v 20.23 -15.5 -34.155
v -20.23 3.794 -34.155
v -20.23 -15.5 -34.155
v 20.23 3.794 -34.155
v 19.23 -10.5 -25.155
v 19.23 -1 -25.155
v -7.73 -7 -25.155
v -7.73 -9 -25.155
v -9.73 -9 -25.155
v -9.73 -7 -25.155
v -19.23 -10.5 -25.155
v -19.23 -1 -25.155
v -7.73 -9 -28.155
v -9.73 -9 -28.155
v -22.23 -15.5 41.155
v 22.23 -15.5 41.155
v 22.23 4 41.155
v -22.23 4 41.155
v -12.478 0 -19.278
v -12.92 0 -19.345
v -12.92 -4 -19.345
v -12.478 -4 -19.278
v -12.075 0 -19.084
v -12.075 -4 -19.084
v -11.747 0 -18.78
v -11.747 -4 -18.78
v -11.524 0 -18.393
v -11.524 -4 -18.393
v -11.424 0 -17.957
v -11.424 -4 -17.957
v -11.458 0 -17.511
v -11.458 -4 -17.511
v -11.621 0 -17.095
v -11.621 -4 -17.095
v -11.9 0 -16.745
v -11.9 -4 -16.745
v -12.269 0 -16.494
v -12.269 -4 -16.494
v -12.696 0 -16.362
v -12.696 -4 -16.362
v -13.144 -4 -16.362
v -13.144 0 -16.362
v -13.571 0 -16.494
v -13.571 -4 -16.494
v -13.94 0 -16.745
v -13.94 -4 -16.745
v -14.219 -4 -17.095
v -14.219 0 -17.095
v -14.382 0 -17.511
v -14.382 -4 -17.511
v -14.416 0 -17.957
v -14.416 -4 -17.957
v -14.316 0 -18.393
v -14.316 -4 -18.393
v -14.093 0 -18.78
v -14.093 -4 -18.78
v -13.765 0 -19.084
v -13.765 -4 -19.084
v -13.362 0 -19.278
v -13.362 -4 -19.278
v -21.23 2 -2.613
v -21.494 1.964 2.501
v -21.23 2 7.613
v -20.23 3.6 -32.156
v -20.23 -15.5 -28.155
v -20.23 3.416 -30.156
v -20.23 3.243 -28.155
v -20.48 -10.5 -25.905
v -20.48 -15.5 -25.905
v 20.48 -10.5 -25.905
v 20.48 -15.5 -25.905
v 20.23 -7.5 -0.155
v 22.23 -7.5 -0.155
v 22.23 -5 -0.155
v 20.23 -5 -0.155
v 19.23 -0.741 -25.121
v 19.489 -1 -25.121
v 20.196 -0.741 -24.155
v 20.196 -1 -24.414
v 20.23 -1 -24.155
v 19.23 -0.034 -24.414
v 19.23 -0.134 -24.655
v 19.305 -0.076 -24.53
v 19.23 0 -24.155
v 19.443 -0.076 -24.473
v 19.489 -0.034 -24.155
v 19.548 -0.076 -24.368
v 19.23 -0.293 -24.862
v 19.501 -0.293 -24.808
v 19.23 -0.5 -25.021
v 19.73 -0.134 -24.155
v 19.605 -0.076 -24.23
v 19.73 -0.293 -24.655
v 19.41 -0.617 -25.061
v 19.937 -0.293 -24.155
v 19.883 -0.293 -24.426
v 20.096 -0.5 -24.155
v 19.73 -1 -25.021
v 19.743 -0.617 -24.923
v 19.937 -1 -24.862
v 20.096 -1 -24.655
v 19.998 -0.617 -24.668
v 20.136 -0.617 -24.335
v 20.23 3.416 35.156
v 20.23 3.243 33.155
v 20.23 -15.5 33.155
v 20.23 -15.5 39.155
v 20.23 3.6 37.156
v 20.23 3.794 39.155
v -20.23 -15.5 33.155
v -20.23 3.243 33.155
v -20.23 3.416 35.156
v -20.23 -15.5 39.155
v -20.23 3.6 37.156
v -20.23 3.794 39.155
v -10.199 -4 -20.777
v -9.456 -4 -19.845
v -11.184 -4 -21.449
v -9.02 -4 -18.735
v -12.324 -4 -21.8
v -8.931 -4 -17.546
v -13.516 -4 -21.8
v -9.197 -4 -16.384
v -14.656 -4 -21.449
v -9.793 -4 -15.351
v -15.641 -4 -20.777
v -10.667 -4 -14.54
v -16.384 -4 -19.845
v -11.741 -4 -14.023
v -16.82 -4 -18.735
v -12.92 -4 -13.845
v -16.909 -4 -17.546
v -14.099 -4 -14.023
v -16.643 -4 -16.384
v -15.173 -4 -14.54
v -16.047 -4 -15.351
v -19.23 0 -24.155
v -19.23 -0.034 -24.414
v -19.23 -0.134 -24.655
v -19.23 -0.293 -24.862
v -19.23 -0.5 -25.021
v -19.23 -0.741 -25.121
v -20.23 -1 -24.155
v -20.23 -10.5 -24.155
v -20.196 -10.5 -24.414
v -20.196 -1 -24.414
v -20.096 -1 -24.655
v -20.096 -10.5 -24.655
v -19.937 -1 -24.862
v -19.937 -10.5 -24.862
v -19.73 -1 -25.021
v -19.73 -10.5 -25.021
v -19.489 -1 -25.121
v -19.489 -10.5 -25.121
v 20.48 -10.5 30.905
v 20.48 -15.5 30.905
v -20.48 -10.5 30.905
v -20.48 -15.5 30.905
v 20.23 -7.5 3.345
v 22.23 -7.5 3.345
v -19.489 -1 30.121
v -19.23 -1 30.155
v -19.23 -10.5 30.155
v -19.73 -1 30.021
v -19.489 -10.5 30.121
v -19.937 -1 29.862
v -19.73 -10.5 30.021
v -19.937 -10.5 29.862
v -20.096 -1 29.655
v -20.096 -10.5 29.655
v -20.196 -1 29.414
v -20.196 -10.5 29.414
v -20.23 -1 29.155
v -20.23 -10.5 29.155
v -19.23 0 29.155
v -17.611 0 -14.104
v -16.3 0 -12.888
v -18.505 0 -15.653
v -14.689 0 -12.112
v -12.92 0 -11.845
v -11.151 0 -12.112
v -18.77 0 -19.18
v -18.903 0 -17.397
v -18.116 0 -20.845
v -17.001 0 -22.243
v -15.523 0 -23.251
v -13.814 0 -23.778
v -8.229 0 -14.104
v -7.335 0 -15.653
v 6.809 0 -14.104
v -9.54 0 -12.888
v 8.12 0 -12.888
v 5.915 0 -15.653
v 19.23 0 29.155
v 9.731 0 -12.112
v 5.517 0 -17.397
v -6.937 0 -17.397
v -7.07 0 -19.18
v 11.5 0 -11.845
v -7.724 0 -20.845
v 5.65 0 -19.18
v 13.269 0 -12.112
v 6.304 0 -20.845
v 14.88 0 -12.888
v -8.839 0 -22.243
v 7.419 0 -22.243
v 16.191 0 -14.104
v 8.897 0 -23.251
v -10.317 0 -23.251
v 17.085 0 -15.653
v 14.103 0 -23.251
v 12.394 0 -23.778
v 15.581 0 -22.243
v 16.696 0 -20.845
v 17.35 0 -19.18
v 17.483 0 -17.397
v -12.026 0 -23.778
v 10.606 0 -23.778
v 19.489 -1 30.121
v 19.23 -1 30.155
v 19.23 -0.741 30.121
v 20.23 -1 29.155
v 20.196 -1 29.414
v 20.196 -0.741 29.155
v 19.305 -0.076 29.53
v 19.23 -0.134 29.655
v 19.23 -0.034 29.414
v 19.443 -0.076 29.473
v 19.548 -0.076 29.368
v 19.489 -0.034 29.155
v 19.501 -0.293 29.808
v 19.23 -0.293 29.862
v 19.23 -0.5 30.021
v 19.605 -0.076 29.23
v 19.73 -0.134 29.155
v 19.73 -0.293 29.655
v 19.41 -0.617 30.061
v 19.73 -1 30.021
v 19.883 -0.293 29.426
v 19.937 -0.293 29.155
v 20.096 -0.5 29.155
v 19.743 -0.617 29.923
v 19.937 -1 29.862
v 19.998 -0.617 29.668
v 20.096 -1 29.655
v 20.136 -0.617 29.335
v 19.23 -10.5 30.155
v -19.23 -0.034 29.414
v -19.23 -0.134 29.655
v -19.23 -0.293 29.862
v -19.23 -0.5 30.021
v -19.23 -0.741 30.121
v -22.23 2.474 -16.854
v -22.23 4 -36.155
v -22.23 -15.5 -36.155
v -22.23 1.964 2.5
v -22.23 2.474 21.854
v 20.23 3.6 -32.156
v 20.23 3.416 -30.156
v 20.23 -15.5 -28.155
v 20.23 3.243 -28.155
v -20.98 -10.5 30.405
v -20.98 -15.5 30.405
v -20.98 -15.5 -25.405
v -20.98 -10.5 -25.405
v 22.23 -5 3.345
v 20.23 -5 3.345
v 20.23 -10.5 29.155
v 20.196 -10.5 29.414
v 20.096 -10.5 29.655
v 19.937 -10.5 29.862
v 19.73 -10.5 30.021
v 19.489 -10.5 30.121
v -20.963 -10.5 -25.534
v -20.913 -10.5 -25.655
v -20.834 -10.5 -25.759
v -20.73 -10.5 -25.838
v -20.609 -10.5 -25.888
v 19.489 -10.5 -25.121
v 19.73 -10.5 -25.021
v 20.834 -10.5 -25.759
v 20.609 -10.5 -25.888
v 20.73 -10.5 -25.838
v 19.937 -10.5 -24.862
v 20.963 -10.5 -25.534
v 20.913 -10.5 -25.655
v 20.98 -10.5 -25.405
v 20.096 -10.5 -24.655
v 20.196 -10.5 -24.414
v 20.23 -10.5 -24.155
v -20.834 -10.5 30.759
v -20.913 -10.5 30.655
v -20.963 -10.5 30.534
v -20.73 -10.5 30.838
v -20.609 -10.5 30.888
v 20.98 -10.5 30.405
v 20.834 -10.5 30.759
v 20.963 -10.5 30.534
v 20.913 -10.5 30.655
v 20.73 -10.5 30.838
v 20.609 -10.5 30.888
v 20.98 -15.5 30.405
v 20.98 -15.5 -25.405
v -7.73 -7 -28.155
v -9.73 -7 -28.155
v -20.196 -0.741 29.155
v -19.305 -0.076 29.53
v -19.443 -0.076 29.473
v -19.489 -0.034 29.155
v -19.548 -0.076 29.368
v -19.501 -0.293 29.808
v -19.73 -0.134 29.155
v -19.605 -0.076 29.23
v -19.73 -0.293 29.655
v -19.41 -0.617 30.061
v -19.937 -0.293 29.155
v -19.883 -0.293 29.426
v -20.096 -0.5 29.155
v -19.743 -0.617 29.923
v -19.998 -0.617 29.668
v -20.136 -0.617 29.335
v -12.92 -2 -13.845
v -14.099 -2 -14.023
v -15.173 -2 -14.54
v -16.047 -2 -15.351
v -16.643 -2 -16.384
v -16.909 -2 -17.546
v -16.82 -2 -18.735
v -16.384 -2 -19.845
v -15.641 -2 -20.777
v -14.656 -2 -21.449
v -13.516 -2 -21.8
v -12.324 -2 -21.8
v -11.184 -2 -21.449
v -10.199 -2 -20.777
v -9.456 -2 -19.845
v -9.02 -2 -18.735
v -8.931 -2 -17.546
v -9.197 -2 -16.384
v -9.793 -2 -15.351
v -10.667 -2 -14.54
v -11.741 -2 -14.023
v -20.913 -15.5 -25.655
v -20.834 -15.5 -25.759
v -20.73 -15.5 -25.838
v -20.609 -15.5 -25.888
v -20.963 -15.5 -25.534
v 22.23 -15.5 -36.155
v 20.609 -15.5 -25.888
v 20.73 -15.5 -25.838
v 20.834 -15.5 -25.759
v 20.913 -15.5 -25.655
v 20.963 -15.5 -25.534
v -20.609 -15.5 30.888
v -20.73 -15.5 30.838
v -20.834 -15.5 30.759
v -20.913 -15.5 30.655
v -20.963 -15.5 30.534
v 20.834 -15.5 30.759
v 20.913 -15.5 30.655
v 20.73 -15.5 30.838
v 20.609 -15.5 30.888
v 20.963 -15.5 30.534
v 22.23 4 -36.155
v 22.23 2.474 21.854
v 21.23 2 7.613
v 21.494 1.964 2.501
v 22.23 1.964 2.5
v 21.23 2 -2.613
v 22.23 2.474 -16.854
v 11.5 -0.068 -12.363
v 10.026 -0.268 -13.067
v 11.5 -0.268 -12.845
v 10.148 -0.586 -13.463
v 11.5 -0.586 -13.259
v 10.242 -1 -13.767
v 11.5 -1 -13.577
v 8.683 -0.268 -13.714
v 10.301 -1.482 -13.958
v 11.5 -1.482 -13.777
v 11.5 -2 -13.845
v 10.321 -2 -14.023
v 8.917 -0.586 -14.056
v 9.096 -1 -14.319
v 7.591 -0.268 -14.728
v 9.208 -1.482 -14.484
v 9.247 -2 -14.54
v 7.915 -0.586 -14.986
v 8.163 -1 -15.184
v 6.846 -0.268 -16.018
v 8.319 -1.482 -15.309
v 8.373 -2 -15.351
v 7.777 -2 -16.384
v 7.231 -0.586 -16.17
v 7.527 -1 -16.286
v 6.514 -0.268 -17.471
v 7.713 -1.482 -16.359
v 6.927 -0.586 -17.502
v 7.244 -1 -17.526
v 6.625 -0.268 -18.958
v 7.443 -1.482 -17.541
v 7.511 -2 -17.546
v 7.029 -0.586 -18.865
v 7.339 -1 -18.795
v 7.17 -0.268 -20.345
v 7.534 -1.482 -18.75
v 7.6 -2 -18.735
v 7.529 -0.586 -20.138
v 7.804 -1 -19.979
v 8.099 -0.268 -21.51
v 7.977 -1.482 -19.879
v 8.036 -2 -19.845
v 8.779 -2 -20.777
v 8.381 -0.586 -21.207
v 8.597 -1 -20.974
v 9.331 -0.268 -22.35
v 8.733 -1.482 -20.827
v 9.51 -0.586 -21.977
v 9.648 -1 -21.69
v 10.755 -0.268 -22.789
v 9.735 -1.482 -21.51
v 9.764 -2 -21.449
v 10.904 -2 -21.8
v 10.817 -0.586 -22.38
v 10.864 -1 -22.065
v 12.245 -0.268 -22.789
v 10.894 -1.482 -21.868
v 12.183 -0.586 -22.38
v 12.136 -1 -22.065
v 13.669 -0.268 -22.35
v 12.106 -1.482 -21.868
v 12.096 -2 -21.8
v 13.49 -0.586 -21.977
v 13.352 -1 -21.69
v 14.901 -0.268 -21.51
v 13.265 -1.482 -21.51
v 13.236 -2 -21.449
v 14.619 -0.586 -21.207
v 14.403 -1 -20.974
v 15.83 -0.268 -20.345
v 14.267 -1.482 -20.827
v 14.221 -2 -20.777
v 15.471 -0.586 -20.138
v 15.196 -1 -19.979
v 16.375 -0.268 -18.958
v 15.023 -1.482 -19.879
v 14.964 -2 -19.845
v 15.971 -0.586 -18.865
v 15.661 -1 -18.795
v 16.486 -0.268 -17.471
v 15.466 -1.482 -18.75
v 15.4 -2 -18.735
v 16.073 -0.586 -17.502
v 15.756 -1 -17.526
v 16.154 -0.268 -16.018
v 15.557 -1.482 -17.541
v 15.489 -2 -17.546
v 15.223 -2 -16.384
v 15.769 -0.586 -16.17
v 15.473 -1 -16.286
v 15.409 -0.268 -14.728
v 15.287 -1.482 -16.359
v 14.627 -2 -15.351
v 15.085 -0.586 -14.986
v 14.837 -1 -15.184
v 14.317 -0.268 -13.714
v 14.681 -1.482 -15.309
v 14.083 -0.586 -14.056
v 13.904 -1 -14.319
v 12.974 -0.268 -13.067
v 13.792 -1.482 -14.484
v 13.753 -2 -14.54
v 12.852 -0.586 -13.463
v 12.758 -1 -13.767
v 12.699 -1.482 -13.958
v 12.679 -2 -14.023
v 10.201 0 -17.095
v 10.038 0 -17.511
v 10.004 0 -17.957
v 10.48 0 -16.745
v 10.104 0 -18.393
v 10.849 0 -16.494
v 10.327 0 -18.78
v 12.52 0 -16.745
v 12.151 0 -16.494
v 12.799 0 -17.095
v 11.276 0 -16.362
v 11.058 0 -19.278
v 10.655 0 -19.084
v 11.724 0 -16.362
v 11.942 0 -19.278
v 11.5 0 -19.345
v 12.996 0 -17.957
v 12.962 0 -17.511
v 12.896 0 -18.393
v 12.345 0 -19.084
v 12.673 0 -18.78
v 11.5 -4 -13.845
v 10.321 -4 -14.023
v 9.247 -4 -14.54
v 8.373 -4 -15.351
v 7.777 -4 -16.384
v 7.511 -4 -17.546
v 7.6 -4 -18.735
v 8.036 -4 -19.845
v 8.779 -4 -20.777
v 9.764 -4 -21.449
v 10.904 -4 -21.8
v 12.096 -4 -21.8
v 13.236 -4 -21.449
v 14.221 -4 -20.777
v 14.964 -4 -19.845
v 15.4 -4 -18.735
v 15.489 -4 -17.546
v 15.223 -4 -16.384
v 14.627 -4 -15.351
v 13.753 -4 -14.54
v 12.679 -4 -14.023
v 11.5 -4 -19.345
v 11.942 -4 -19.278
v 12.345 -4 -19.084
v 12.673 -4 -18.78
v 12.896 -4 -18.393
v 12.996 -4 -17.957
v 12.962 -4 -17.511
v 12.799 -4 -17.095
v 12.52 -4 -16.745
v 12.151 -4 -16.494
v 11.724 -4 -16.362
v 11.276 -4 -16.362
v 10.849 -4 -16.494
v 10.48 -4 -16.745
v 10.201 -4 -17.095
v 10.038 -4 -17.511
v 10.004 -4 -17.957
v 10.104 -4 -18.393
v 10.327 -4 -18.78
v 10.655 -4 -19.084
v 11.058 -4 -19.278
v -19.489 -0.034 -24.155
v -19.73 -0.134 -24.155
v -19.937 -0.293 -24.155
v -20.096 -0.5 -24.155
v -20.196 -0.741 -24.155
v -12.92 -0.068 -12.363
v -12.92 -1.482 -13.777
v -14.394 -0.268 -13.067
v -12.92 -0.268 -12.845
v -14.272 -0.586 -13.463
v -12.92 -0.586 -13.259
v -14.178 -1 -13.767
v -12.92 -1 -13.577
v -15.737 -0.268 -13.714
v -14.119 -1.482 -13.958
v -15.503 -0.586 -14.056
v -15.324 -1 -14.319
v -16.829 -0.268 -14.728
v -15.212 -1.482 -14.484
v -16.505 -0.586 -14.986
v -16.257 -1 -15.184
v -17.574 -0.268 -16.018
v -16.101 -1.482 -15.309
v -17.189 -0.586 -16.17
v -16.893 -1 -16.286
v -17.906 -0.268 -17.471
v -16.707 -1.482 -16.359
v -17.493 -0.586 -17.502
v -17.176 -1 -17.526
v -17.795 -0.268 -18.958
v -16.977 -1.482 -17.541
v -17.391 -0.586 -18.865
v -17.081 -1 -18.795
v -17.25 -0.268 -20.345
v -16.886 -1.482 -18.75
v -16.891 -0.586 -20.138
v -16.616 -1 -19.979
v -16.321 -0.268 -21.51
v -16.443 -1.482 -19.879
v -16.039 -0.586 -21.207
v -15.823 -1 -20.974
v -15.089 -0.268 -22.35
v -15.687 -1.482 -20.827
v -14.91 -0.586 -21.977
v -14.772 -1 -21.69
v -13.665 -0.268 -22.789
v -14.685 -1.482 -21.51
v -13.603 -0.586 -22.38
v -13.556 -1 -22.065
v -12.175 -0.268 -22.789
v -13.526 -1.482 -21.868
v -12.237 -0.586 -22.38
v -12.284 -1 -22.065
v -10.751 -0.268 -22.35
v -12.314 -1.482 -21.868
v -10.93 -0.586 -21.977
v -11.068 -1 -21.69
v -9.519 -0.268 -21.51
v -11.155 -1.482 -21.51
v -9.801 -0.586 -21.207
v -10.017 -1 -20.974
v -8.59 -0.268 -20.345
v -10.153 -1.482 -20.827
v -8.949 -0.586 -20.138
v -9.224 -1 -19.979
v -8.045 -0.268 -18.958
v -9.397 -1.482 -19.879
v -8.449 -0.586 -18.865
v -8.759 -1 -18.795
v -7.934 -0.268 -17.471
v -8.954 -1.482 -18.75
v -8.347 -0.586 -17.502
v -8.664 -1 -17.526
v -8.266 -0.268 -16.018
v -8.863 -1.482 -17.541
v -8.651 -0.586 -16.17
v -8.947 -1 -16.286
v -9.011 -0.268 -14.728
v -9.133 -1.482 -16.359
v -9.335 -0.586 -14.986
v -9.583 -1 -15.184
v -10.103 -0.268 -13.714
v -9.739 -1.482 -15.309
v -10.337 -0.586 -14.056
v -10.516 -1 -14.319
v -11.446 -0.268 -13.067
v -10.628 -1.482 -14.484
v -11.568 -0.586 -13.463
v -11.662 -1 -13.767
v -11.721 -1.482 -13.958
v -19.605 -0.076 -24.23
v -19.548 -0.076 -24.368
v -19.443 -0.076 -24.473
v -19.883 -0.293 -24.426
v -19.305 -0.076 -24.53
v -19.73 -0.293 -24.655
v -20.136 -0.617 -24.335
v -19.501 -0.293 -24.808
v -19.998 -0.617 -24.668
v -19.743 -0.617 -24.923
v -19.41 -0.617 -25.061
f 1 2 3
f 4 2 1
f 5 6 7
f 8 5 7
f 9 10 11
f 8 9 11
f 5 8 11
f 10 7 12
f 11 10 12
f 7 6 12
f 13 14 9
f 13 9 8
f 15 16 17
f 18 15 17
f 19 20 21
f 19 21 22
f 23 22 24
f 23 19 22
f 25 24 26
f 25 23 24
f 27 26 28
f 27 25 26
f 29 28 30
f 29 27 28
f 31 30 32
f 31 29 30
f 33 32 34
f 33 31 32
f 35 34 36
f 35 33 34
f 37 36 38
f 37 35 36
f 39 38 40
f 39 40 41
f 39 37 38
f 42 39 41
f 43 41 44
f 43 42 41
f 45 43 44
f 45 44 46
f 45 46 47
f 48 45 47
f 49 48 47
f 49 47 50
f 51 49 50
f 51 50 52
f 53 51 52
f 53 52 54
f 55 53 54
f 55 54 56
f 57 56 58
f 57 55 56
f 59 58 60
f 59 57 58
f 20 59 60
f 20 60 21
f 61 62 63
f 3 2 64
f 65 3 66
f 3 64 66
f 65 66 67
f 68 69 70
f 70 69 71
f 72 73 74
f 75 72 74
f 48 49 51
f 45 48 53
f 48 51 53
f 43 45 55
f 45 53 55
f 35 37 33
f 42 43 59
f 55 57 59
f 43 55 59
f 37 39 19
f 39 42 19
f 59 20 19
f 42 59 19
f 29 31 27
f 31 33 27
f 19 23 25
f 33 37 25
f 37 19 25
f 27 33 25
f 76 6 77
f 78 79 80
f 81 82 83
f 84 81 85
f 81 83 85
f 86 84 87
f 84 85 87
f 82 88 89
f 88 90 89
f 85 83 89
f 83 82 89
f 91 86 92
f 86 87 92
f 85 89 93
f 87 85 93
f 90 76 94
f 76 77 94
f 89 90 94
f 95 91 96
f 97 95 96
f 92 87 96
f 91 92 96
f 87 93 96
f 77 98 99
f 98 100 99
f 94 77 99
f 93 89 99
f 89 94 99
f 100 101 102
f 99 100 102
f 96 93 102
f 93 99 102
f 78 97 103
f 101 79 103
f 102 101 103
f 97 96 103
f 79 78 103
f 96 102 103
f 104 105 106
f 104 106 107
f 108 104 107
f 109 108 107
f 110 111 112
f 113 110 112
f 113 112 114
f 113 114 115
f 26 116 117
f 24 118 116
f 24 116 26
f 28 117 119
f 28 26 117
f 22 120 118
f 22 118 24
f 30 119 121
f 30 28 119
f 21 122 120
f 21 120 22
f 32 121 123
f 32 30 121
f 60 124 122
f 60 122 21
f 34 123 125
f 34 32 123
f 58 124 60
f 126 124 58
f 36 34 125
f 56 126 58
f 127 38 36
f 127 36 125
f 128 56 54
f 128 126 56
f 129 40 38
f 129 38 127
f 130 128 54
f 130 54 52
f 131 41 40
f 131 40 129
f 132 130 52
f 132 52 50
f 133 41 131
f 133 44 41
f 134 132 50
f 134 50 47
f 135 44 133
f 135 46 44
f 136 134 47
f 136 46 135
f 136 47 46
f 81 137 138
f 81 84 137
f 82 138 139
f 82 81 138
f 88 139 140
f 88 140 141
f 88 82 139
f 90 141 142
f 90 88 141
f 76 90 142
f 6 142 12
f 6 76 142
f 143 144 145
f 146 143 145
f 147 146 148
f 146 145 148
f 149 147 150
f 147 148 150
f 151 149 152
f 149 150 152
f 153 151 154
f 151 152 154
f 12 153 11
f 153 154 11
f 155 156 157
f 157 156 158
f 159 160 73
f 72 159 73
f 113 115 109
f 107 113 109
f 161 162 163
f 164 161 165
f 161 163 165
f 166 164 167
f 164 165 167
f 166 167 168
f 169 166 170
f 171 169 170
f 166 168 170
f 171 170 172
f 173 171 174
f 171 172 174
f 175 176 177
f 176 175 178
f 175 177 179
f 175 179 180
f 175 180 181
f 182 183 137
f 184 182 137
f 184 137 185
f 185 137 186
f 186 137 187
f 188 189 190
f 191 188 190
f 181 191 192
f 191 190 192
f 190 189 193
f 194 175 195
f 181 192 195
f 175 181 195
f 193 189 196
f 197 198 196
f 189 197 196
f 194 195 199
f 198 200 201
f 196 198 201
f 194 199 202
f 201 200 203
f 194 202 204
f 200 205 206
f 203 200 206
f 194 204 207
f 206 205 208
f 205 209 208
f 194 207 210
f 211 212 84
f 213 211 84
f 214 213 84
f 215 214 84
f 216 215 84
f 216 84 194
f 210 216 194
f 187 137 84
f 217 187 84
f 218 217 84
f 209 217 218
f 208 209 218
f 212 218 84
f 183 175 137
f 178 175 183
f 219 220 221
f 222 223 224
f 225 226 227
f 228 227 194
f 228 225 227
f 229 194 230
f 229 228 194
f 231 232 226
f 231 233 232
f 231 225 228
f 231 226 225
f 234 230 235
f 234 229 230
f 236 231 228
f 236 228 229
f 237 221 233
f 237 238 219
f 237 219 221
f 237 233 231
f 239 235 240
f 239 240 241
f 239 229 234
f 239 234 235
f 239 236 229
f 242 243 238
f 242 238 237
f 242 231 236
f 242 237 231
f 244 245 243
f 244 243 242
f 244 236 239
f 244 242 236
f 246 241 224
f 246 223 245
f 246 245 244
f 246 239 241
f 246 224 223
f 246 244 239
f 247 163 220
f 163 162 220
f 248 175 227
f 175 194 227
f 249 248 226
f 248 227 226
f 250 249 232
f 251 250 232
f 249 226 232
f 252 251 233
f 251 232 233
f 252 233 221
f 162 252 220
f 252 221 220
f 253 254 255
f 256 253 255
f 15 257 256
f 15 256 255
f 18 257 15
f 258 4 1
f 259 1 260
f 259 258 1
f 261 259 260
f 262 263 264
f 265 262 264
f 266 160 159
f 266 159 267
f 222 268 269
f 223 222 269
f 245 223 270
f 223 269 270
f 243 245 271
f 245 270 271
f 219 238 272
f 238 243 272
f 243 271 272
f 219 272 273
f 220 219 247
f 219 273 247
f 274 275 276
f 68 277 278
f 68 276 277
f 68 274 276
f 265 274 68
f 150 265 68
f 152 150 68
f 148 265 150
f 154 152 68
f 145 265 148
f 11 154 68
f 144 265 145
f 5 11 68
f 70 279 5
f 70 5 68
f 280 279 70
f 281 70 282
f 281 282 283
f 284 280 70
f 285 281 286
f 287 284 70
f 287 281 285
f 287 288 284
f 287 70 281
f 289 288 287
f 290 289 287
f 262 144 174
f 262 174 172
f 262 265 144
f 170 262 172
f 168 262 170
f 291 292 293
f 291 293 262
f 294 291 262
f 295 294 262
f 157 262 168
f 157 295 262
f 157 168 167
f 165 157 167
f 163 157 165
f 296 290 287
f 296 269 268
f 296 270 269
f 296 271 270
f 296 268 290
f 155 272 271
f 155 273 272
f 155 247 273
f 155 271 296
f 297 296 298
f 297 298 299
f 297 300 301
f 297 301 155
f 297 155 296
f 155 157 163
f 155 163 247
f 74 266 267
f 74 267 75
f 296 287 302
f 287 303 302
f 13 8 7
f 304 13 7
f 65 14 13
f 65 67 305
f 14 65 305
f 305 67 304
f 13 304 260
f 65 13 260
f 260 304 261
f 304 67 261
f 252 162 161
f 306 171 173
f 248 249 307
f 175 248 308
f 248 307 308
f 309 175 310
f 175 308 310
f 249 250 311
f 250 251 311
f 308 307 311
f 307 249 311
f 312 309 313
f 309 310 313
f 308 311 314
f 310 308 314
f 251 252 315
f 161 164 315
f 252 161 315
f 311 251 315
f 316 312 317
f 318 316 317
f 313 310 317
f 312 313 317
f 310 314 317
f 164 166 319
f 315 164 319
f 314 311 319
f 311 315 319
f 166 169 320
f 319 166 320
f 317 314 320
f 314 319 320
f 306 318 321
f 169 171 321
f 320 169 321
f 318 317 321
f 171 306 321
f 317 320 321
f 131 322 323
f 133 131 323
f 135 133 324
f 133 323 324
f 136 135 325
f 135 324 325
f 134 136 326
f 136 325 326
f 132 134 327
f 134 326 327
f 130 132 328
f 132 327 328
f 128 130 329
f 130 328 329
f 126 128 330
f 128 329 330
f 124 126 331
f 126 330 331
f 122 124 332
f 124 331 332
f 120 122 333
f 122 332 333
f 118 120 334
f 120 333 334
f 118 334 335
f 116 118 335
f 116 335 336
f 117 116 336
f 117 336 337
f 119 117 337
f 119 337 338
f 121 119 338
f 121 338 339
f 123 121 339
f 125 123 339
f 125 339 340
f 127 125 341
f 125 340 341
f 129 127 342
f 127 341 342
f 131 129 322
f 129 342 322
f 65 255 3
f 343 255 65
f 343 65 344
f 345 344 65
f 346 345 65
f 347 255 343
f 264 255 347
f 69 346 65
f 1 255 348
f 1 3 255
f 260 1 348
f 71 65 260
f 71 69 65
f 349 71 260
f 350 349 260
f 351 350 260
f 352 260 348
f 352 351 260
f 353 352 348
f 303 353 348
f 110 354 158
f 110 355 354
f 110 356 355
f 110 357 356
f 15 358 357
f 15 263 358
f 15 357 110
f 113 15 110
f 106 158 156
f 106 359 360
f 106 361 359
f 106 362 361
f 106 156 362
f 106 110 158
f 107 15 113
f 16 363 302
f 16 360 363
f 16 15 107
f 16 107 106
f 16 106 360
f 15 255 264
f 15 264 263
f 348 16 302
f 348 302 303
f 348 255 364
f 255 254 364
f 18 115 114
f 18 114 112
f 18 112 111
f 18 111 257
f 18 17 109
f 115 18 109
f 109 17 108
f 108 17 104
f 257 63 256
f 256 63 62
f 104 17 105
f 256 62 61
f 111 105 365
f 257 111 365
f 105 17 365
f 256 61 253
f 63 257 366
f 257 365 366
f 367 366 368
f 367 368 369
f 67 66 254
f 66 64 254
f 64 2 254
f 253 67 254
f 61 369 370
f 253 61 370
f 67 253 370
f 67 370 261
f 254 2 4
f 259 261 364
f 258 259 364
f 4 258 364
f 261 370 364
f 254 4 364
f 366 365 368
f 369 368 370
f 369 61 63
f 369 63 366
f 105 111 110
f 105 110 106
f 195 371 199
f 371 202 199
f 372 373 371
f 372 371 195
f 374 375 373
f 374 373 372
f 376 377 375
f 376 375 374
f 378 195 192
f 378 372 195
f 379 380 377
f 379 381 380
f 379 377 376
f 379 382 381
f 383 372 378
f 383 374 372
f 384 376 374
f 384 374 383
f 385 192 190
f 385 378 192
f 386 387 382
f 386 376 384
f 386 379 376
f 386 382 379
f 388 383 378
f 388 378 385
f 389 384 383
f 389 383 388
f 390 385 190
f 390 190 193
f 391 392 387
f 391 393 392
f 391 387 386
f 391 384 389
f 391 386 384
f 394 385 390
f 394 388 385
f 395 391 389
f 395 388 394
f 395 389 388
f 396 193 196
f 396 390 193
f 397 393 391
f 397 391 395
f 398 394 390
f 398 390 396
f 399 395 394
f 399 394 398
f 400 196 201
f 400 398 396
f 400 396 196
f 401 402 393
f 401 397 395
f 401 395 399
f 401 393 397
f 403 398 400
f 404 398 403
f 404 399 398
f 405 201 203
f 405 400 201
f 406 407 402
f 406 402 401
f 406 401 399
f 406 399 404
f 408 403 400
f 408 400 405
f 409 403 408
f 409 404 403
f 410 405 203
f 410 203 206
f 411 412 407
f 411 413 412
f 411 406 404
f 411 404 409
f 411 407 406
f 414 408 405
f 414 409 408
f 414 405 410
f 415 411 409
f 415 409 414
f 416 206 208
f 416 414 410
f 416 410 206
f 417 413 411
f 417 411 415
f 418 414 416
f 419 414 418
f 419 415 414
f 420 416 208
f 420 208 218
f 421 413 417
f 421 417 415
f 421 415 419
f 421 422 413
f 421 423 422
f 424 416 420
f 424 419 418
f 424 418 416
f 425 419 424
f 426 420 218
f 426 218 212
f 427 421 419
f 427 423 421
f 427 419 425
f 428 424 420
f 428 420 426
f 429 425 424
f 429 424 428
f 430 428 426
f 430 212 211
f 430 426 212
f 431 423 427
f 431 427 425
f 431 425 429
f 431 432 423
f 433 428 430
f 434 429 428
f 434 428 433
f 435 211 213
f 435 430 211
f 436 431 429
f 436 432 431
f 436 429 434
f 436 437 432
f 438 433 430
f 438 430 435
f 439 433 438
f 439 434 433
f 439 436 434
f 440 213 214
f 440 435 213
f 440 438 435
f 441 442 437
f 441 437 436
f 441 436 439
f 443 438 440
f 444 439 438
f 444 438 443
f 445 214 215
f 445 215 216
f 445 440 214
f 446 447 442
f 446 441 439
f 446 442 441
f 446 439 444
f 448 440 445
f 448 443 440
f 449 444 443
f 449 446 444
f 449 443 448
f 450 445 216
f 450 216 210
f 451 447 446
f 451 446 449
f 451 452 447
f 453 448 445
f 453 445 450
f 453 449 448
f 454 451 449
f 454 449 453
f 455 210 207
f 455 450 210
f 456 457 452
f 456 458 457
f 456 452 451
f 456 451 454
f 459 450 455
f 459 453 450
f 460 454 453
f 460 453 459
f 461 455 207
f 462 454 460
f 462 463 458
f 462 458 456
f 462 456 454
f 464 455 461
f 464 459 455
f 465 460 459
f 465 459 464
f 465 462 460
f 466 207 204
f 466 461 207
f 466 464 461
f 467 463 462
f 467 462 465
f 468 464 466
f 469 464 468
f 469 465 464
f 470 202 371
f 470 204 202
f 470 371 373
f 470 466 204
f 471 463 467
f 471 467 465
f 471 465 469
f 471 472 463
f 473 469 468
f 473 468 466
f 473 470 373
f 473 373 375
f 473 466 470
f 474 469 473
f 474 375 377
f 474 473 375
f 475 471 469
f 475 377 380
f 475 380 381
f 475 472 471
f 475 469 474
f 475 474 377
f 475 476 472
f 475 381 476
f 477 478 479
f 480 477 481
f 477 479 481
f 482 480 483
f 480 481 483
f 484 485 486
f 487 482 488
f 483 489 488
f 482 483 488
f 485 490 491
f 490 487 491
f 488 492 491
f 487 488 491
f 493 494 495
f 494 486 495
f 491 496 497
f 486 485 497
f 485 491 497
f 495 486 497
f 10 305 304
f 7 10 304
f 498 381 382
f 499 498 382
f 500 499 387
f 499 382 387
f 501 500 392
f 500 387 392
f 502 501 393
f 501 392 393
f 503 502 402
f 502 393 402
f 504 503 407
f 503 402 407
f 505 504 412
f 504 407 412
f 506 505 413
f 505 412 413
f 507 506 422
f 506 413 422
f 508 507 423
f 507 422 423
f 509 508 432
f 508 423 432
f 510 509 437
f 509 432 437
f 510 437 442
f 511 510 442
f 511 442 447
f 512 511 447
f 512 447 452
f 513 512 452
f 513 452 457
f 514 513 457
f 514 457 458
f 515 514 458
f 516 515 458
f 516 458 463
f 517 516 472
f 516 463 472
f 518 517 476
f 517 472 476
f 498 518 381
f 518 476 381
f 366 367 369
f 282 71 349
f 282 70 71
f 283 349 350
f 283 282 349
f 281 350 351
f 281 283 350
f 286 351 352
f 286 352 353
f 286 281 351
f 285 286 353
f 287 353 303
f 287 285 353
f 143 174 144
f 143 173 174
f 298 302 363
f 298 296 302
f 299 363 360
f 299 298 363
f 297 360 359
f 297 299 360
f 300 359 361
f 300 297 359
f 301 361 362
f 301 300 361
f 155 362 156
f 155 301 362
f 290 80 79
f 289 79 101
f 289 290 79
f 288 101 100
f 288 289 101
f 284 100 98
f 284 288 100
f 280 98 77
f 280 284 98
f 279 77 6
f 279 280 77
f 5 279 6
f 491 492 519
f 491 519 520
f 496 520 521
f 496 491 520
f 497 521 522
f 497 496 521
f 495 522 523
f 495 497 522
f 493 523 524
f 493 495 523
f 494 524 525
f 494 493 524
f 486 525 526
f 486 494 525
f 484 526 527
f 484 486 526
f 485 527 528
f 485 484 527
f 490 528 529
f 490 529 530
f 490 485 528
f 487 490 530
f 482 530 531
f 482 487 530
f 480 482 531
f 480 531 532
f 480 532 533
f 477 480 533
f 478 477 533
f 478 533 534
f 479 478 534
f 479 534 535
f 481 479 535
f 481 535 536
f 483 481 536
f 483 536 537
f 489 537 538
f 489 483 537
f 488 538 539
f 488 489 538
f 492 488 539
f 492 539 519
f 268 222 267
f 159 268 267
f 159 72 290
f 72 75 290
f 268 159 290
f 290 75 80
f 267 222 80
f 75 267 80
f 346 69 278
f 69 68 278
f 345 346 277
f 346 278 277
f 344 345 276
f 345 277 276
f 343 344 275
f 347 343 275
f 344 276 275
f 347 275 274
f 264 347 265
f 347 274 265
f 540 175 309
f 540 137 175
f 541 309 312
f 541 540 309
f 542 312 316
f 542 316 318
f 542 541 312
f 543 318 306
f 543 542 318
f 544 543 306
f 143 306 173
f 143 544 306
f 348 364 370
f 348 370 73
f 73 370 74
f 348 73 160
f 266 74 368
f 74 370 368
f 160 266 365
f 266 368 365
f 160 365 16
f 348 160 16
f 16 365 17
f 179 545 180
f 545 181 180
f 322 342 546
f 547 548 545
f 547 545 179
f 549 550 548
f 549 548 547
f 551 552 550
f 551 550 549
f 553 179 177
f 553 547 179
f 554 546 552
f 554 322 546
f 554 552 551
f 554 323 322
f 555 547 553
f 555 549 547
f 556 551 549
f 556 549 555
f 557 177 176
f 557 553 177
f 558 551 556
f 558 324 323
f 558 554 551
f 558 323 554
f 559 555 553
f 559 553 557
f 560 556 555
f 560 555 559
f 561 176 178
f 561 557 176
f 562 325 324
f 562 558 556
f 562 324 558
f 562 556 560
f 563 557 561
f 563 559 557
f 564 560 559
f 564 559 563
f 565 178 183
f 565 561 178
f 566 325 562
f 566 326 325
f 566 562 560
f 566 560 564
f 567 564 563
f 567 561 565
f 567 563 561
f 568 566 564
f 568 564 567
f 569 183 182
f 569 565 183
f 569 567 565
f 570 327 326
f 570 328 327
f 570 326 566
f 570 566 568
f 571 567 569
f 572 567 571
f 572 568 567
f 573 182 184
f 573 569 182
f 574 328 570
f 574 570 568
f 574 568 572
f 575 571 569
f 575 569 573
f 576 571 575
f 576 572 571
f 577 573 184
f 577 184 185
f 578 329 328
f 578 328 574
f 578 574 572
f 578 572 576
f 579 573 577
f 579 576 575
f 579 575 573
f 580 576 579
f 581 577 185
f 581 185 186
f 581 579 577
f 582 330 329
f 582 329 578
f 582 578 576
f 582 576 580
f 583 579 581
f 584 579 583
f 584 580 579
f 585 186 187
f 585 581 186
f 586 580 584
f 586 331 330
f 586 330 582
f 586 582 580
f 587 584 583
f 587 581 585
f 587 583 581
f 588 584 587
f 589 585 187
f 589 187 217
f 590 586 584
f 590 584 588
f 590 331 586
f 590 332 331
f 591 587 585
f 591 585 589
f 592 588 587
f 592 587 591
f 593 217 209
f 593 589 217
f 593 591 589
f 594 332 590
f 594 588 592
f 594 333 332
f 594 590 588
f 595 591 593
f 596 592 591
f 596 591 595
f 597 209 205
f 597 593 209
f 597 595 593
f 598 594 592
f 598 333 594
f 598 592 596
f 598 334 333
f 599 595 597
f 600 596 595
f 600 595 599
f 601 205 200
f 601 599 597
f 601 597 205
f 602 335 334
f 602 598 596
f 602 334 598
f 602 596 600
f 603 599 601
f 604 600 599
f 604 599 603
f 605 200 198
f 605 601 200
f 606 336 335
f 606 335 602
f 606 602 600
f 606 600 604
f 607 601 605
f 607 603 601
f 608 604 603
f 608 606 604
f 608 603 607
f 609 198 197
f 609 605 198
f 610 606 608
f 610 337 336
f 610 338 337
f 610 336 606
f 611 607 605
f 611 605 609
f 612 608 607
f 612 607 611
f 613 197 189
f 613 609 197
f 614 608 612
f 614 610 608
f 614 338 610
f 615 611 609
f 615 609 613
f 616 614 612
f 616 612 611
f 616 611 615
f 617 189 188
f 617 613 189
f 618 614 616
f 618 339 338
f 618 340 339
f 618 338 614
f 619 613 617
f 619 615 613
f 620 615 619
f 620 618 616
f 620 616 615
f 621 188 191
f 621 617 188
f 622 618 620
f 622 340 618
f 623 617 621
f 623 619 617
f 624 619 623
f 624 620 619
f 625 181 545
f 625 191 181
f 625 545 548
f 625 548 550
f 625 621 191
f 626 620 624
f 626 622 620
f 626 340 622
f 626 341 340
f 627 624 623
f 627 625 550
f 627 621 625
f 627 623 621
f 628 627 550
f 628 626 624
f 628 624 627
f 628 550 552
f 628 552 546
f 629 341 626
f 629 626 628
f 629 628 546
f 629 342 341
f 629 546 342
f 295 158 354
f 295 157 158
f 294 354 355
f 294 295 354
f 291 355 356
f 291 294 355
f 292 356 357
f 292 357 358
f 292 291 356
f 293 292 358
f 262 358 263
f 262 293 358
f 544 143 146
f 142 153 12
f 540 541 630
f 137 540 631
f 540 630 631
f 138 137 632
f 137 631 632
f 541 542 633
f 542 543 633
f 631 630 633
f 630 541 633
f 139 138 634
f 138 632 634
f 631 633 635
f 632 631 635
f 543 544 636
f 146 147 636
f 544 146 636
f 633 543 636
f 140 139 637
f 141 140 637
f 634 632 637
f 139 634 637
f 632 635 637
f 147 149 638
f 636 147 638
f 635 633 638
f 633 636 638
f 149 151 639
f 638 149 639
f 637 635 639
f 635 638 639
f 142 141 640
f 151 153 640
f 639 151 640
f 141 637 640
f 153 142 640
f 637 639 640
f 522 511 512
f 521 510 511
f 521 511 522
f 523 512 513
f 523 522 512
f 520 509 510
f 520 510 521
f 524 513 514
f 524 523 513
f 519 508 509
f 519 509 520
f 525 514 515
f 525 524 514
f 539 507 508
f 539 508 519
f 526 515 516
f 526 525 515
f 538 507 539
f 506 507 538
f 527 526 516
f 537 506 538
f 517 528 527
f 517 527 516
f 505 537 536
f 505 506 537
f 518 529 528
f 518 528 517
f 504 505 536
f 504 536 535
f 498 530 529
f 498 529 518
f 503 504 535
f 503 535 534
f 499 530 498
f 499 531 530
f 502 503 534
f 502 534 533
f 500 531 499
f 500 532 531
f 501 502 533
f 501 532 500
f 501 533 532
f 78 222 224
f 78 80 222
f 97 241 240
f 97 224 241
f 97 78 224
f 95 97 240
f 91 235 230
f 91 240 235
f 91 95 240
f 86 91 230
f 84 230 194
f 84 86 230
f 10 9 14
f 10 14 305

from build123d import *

# Parameters (mm, degrees)
SKETCH2_W               = 40.46
SKETCH2_H               = 55.31
BOSS_EXTRUDE1_DEPTH     = 2
SKETCH3_R               = 4
SKETCH3_R_2             = 1.5
BOSS_EXTRUDE2_DEPTH     = 4
FILLET1_R               = 2
SKETCH6_W               = 44.46
SKETCH6_H               = 59.31
SKETCH6_W_2             = 40.46
SKETCH6_H_2             = 55.31
BOSS_EXTRUDE3_DEPTH     = 17.5
SKETCH9_W               = 0.75
SKETCH9_H               = 5
CUT_EXTRUDE1_DEPTH      = 5
FILLET3_R               = 1
FILLET4_R               = 0.5
SKETCH12_W              = 44.46
SKETCH12_H              = 10
SKETCH12_W_2            = 40.46
SKETCH12_H_2            = 6
BOSS_EXTRUDE4_DEPTH     = 8
FILLET5_R               = 1
CUT_EXTRUDE2_DEPTH      = 10
CUT_EXTRUDE2_DEPTH_BACK = 8
SKETCH11_W              = 2
SKETCH11_H              = 2
SKETCH13_W              = 3.5
SKETCH13_H              = 2.5
CUT_EXTRUDE3_DEPTH      = 8
BOSS_EXTRUDE5_REACH     = 64.535
CUT_EXTRUDE4_DEPTH      = 48.832070201
CUT_EXTRUDE4_DEPTH_BACK = 48.832070201
SKETCH16_W              = 40.46
SKETCH16_H              = 6
SKETCH19_W              = 44.46
SKETCH19_H              = 10
SKETCH19_W_2            = 40.46
SKETCH19_H_2            = 6
BOSS_EXTRUDE7_DEPTH     = 9.5
SKETCH20_W              = 2
SKETCH20_H              = 2
CUT_EXTRUDE5_DEPTH      = 5


with BuildPart() as part:
    # Sketch2 → Boss-Extrude1 (new body)
    with BuildSketch(Plane(origin=(0, 0, 0), x_dir=(1, 0, 0), z_dir=(0, 1, 0))):
        with Locations((0, -2.5)):
            Rectangle(SKETCH2_W, SKETCH2_H)
    extrude(amount=BOSS_EXTRUDE1_DEPTH)

    # Sketch3 → Boss-Extrude2 (add)
    # profile 1 of 2: a face of its own
    with BuildSketch(Plane.XZ):
        with Locations(Location((-12.92, -17.845, 0), (0, 0, 90))):
            Circle(SKETCH3_R)
        with Locations(Location((-12.92, -17.845, 0), (0, 0, 270))):
            Circle(SKETCH3_R_2, mode=Mode.SUBTRACT)
    # profile 2 of 2: a face of its own
    with BuildSketch(Plane.XZ):
        with Locations(Location((11.5, -17.845, 0), (0, 0, 90))):
            Circle(SKETCH3_R)
        with Locations(Location((11.5, -17.845, 0), (0, 0, 270))):
            Circle(SKETCH3_R_2, mode=Mode.SUBTRACT)
    extrude(amount=BOSS_EXTRUDE2_DEPTH)

    # Fillet1
    fillet1_edges = [part.edges().sort_by_distance(p)[0] for p in [
        (-12.92, 0, -21.845),
        (11.5, 0, -21.845),
    ]]
    fillet(fillet1_edges, radius=FILLET1_R)

    # Sketch6 → Boss-Extrude3 (add)
    with BuildSketch(Plane(origin=(0, 2, 0), x_dir=(1, 0, 0), z_dir=(0, 1, 0))):
        with Locations((0, -2.5)):
            Rectangle(SKETCH6_W, SKETCH6_H)
        with Locations((0, -2.5)):
            Rectangle(SKETCH6_W_2, SKETCH6_H_2, mode=Mode.SUBTRACT)
    extrude(amount=-BOSS_EXTRUDE3_DEPTH)

    # Cut-Sweep1: sweep along a curve in space
    with BuildLine() as cut_sweep1_path:
        Line((-20.23, -15.5, -25.155), (-20.23, -15.5, 30.155))
    # Sketch9 → Cut-Sweep1 (sweep, cut)
    with BuildSketch(Plane(origin=(0, 0, 30.155), x_dir=(-1, 0, 0), z_dir=(0, 0, -1))):
        with Locations((20.605, -13)):
            Rectangle(SKETCH9_W, SKETCH9_H)
        with Locations((-20.605, -13)):
            Rectangle(SKETCH9_W, SKETCH9_H)
    sweep(path=cut_sweep1_path.line, mode=Mode.SUBTRACT)

    # Sketch10 → Cut-Extrude1 (cut)
    with BuildSketch(Plane.XZ.offset(15.5)):
        Polygon((-20.23, 30.155), (20.23, 30.155), (20.98, 30.155), (20.98, 30.905), (-20.98, 30.905), (-20.98, 30.155), align=None)
        Polygon((20.23, -25.155), (-20.23, -25.155), (-20.98, -25.155), (-20.98, -25.905), (20.98, -25.905), (20.98, -25.155), align=None)
    extrude(amount=-CUT_EXTRUDE1_DEPTH, mode=Mode.SUBTRACT)

    # Fillet3
    fillet3_edges = [part.edges().sort_by_distance(p)[0] for p in [
        (22.23, -6.75, 32.155),
        (22.23, -6.75, -27.155),
        (-22.23, -6.75, -27.155),
        (-22.23, -6.75, 32.155),
        (0, 2, -27.155),
        (22.23, 2, 2.5),
        (0, 2, 32.155),
        (-22.23, 2, 2.5),
        (-20.23, -5.25, 30.155),
        (-20.23, -5.25, -25.155),
        (20.23, -5.25, -25.155),
        (20.23, -5.25, 30.155),
        (0, 0, 30.155),
        (-20.23, 0, 2.5),
        (0, 0, -25.155),
        (20.23, 0, 2.5),
    ]]
    fillet(fillet3_edges, radius=FILLET3_R)

    # Fillet4
    fillet4_edges = [part.edges().sort_by_distance(p)[0] for p in [
        (20.98, -13, -25.905),
        (-20.98, -13, -25.905),
        (-20.98, -13, 30.905),
        (20.98, -13, 30.905),
    ]]
    fillet(fillet4_edges, radius=FILLET4_R)

    # Sketch12 → Boss-Extrude4 (add)
    # profile 1 of 2: a face of its own
    with BuildSketch(Plane(origin=(0, 2, 0), x_dir=(1, 0, 0), z_dir=(0, 1, 0))):
        with Locations((0, 31.155)):
            Rectangle(SKETCH12_W, SKETCH12_H)
        with Locations((0, 31.155)):
            Rectangle(SKETCH12_W_2, SKETCH12_H_2, mode=Mode.SUBTRACT)
    # profile 2 of 2: a face of its own
    with BuildSketch(Plane(origin=(0, 2, 0), x_dir=(1, 0, 0), z_dir=(0, 1, 0))):
        with Locations((0, -36.155)):
            Rectangle(SKETCH12_W, SKETCH12_H)
        with Locations((0, -36.155)):
            Rectangle(SKETCH12_W_2, SKETCH12_H_2, mode=Mode.SUBTRACT)
    extrude(amount=-BOSS_EXTRUDE4_DEPTH)

    # Fillet5
    fillet5_edges = [part.edges().sort_by_distance(p)[0] for p in [
        (-22.23, 2, 36.155),
        (-22.23, 2, -31.155),
        (22.23, 2, 36.155),
        (22.23, 2, -31.155),
    ]]
    fillet(fillet5_edges, radius=FILLET5_R)

    # Sketch11 → Cut-Extrude2 (cut, two sides: drawn at the far end of the back side and taken through both)
    with BuildSketch(Plane(origin=(0, 0, -27.155), x_dir=(-1, 0, 0), z_dir=(0, 0, -1)).offset(-CUT_EXTRUDE2_DEPTH_BACK)):
        with Locations((8.73, -8)):
            Rectangle(SKETCH11_W, SKETCH11_H)
    extrude(amount=CUT_EXTRUDE2_DEPTH + CUT_EXTRUDE2_DEPTH_BACK, mode=Mode.SUBTRACT)

    # Sketch13 → Cut-Extrude3 (cut)
    with BuildSketch(Plane(origin=(22.23, 0, 0), x_dir=(0, 0, -1), z_dir=(1, 0, 0))):
        with Locations((-1.595, -6.25)):
            Rectangle(SKETCH13_W, SKETCH13_H)
    extrude(amount=-CUT_EXTRUDE3_DEPTH, mode=Mode.SUBTRACT)

    # Boss-Extrude5: up to this face of the body (flat: up to its plane)
    boss_extrude5_end = Plane(part.part.faces().sort_by_distance((-22.23, -6.637443983, 2.5))[0])
    # Sketch14 → Boss-Extrude5 (add, up to the picked face)
    with BuildSketch(Plane(origin=(22.23, 0, 0), x_dir=(0, 0, -1), z_dir=(1, 0, 0)), mode=Mode.PRIVATE) as boss_extrude5_sk1:
        with BuildLine():
            Line((36.155, 4), (36.155, 1))
            Line((36.155, 1), (-41.155, 1))
            Line((-41.155, 1), (-41.155, 4))
            ThreePointArc((-41.155, 4), (-2.5, 1.964478359), (36.155, 4))
        make_face()
    boss_extrude5_tool1 = split(extrude(boss_extrude5_sk1.sketch, amount=-BOSS_EXTRUDE5_REACH, mode=Mode.PRIVATE), bisect_by=boss_extrude5_end, keep=Keep.BOTH, mode=Mode.PRIVATE)
    add(boss_extrude5_tool1.solids().sort_by(Axis((22.23, 1.933161, 2.5), (-1, 0, 0)))[0])

    # Sketch16 → Cut-Extrude4 (cut, two sides: drawn at the far end of the back side and taken through both)
    with BuildSketch(Plane.XZ.offset(6).offset(-CUT_EXTRUDE4_DEPTH_BACK)):
        with Locations((0, 36.155)):
            Rectangle(SKETCH16_W, SKETCH16_H)
        with Locations((0, -31.155)):
            Rectangle(SKETCH16_W, SKETCH16_H)
    extrude(amount=CUT_EXTRUDE4_DEPTH + CUT_EXTRUDE4_DEPTH_BACK, mode=Mode.SUBTRACT)

    # Sketch19 → Boss-Extrude7 (add)
    # profile 1 of 2: a face of its own
    with BuildSketch(Plane.XZ.offset(6)):
        with Locations((0, -31.155)):
            Rectangle(SKETCH19_W, SKETCH19_H)
        with Locations((0, -31.155)):
            Rectangle(SKETCH19_W_2, SKETCH19_H_2, mode=Mode.SUBTRACT)
    # profile 2 of 2: a face of its own
    with BuildSketch(Plane.XZ.offset(6)):
        with Locations((0, 36.155)):
            Rectangle(SKETCH19_W, SKETCH19_H)
        with Locations((0, 36.155)):
            Rectangle(SKETCH19_W_2, SKETCH19_H_2, mode=Mode.SUBTRACT)
    extrude(amount=BOSS_EXTRUDE7_DEPTH)

    # Sketch20 → Cut-Extrude5 (cut)
    with BuildSketch(Plane.XY.offset(-26.155)):
        with Locations((-8.73, -8)):
            Rectangle(SKETCH20_W, SKETCH20_H)
    extrude(amount=-CUT_EXTRUDE5_DEPTH, mode=Mode.SUBTRACT)


solid = part.part
